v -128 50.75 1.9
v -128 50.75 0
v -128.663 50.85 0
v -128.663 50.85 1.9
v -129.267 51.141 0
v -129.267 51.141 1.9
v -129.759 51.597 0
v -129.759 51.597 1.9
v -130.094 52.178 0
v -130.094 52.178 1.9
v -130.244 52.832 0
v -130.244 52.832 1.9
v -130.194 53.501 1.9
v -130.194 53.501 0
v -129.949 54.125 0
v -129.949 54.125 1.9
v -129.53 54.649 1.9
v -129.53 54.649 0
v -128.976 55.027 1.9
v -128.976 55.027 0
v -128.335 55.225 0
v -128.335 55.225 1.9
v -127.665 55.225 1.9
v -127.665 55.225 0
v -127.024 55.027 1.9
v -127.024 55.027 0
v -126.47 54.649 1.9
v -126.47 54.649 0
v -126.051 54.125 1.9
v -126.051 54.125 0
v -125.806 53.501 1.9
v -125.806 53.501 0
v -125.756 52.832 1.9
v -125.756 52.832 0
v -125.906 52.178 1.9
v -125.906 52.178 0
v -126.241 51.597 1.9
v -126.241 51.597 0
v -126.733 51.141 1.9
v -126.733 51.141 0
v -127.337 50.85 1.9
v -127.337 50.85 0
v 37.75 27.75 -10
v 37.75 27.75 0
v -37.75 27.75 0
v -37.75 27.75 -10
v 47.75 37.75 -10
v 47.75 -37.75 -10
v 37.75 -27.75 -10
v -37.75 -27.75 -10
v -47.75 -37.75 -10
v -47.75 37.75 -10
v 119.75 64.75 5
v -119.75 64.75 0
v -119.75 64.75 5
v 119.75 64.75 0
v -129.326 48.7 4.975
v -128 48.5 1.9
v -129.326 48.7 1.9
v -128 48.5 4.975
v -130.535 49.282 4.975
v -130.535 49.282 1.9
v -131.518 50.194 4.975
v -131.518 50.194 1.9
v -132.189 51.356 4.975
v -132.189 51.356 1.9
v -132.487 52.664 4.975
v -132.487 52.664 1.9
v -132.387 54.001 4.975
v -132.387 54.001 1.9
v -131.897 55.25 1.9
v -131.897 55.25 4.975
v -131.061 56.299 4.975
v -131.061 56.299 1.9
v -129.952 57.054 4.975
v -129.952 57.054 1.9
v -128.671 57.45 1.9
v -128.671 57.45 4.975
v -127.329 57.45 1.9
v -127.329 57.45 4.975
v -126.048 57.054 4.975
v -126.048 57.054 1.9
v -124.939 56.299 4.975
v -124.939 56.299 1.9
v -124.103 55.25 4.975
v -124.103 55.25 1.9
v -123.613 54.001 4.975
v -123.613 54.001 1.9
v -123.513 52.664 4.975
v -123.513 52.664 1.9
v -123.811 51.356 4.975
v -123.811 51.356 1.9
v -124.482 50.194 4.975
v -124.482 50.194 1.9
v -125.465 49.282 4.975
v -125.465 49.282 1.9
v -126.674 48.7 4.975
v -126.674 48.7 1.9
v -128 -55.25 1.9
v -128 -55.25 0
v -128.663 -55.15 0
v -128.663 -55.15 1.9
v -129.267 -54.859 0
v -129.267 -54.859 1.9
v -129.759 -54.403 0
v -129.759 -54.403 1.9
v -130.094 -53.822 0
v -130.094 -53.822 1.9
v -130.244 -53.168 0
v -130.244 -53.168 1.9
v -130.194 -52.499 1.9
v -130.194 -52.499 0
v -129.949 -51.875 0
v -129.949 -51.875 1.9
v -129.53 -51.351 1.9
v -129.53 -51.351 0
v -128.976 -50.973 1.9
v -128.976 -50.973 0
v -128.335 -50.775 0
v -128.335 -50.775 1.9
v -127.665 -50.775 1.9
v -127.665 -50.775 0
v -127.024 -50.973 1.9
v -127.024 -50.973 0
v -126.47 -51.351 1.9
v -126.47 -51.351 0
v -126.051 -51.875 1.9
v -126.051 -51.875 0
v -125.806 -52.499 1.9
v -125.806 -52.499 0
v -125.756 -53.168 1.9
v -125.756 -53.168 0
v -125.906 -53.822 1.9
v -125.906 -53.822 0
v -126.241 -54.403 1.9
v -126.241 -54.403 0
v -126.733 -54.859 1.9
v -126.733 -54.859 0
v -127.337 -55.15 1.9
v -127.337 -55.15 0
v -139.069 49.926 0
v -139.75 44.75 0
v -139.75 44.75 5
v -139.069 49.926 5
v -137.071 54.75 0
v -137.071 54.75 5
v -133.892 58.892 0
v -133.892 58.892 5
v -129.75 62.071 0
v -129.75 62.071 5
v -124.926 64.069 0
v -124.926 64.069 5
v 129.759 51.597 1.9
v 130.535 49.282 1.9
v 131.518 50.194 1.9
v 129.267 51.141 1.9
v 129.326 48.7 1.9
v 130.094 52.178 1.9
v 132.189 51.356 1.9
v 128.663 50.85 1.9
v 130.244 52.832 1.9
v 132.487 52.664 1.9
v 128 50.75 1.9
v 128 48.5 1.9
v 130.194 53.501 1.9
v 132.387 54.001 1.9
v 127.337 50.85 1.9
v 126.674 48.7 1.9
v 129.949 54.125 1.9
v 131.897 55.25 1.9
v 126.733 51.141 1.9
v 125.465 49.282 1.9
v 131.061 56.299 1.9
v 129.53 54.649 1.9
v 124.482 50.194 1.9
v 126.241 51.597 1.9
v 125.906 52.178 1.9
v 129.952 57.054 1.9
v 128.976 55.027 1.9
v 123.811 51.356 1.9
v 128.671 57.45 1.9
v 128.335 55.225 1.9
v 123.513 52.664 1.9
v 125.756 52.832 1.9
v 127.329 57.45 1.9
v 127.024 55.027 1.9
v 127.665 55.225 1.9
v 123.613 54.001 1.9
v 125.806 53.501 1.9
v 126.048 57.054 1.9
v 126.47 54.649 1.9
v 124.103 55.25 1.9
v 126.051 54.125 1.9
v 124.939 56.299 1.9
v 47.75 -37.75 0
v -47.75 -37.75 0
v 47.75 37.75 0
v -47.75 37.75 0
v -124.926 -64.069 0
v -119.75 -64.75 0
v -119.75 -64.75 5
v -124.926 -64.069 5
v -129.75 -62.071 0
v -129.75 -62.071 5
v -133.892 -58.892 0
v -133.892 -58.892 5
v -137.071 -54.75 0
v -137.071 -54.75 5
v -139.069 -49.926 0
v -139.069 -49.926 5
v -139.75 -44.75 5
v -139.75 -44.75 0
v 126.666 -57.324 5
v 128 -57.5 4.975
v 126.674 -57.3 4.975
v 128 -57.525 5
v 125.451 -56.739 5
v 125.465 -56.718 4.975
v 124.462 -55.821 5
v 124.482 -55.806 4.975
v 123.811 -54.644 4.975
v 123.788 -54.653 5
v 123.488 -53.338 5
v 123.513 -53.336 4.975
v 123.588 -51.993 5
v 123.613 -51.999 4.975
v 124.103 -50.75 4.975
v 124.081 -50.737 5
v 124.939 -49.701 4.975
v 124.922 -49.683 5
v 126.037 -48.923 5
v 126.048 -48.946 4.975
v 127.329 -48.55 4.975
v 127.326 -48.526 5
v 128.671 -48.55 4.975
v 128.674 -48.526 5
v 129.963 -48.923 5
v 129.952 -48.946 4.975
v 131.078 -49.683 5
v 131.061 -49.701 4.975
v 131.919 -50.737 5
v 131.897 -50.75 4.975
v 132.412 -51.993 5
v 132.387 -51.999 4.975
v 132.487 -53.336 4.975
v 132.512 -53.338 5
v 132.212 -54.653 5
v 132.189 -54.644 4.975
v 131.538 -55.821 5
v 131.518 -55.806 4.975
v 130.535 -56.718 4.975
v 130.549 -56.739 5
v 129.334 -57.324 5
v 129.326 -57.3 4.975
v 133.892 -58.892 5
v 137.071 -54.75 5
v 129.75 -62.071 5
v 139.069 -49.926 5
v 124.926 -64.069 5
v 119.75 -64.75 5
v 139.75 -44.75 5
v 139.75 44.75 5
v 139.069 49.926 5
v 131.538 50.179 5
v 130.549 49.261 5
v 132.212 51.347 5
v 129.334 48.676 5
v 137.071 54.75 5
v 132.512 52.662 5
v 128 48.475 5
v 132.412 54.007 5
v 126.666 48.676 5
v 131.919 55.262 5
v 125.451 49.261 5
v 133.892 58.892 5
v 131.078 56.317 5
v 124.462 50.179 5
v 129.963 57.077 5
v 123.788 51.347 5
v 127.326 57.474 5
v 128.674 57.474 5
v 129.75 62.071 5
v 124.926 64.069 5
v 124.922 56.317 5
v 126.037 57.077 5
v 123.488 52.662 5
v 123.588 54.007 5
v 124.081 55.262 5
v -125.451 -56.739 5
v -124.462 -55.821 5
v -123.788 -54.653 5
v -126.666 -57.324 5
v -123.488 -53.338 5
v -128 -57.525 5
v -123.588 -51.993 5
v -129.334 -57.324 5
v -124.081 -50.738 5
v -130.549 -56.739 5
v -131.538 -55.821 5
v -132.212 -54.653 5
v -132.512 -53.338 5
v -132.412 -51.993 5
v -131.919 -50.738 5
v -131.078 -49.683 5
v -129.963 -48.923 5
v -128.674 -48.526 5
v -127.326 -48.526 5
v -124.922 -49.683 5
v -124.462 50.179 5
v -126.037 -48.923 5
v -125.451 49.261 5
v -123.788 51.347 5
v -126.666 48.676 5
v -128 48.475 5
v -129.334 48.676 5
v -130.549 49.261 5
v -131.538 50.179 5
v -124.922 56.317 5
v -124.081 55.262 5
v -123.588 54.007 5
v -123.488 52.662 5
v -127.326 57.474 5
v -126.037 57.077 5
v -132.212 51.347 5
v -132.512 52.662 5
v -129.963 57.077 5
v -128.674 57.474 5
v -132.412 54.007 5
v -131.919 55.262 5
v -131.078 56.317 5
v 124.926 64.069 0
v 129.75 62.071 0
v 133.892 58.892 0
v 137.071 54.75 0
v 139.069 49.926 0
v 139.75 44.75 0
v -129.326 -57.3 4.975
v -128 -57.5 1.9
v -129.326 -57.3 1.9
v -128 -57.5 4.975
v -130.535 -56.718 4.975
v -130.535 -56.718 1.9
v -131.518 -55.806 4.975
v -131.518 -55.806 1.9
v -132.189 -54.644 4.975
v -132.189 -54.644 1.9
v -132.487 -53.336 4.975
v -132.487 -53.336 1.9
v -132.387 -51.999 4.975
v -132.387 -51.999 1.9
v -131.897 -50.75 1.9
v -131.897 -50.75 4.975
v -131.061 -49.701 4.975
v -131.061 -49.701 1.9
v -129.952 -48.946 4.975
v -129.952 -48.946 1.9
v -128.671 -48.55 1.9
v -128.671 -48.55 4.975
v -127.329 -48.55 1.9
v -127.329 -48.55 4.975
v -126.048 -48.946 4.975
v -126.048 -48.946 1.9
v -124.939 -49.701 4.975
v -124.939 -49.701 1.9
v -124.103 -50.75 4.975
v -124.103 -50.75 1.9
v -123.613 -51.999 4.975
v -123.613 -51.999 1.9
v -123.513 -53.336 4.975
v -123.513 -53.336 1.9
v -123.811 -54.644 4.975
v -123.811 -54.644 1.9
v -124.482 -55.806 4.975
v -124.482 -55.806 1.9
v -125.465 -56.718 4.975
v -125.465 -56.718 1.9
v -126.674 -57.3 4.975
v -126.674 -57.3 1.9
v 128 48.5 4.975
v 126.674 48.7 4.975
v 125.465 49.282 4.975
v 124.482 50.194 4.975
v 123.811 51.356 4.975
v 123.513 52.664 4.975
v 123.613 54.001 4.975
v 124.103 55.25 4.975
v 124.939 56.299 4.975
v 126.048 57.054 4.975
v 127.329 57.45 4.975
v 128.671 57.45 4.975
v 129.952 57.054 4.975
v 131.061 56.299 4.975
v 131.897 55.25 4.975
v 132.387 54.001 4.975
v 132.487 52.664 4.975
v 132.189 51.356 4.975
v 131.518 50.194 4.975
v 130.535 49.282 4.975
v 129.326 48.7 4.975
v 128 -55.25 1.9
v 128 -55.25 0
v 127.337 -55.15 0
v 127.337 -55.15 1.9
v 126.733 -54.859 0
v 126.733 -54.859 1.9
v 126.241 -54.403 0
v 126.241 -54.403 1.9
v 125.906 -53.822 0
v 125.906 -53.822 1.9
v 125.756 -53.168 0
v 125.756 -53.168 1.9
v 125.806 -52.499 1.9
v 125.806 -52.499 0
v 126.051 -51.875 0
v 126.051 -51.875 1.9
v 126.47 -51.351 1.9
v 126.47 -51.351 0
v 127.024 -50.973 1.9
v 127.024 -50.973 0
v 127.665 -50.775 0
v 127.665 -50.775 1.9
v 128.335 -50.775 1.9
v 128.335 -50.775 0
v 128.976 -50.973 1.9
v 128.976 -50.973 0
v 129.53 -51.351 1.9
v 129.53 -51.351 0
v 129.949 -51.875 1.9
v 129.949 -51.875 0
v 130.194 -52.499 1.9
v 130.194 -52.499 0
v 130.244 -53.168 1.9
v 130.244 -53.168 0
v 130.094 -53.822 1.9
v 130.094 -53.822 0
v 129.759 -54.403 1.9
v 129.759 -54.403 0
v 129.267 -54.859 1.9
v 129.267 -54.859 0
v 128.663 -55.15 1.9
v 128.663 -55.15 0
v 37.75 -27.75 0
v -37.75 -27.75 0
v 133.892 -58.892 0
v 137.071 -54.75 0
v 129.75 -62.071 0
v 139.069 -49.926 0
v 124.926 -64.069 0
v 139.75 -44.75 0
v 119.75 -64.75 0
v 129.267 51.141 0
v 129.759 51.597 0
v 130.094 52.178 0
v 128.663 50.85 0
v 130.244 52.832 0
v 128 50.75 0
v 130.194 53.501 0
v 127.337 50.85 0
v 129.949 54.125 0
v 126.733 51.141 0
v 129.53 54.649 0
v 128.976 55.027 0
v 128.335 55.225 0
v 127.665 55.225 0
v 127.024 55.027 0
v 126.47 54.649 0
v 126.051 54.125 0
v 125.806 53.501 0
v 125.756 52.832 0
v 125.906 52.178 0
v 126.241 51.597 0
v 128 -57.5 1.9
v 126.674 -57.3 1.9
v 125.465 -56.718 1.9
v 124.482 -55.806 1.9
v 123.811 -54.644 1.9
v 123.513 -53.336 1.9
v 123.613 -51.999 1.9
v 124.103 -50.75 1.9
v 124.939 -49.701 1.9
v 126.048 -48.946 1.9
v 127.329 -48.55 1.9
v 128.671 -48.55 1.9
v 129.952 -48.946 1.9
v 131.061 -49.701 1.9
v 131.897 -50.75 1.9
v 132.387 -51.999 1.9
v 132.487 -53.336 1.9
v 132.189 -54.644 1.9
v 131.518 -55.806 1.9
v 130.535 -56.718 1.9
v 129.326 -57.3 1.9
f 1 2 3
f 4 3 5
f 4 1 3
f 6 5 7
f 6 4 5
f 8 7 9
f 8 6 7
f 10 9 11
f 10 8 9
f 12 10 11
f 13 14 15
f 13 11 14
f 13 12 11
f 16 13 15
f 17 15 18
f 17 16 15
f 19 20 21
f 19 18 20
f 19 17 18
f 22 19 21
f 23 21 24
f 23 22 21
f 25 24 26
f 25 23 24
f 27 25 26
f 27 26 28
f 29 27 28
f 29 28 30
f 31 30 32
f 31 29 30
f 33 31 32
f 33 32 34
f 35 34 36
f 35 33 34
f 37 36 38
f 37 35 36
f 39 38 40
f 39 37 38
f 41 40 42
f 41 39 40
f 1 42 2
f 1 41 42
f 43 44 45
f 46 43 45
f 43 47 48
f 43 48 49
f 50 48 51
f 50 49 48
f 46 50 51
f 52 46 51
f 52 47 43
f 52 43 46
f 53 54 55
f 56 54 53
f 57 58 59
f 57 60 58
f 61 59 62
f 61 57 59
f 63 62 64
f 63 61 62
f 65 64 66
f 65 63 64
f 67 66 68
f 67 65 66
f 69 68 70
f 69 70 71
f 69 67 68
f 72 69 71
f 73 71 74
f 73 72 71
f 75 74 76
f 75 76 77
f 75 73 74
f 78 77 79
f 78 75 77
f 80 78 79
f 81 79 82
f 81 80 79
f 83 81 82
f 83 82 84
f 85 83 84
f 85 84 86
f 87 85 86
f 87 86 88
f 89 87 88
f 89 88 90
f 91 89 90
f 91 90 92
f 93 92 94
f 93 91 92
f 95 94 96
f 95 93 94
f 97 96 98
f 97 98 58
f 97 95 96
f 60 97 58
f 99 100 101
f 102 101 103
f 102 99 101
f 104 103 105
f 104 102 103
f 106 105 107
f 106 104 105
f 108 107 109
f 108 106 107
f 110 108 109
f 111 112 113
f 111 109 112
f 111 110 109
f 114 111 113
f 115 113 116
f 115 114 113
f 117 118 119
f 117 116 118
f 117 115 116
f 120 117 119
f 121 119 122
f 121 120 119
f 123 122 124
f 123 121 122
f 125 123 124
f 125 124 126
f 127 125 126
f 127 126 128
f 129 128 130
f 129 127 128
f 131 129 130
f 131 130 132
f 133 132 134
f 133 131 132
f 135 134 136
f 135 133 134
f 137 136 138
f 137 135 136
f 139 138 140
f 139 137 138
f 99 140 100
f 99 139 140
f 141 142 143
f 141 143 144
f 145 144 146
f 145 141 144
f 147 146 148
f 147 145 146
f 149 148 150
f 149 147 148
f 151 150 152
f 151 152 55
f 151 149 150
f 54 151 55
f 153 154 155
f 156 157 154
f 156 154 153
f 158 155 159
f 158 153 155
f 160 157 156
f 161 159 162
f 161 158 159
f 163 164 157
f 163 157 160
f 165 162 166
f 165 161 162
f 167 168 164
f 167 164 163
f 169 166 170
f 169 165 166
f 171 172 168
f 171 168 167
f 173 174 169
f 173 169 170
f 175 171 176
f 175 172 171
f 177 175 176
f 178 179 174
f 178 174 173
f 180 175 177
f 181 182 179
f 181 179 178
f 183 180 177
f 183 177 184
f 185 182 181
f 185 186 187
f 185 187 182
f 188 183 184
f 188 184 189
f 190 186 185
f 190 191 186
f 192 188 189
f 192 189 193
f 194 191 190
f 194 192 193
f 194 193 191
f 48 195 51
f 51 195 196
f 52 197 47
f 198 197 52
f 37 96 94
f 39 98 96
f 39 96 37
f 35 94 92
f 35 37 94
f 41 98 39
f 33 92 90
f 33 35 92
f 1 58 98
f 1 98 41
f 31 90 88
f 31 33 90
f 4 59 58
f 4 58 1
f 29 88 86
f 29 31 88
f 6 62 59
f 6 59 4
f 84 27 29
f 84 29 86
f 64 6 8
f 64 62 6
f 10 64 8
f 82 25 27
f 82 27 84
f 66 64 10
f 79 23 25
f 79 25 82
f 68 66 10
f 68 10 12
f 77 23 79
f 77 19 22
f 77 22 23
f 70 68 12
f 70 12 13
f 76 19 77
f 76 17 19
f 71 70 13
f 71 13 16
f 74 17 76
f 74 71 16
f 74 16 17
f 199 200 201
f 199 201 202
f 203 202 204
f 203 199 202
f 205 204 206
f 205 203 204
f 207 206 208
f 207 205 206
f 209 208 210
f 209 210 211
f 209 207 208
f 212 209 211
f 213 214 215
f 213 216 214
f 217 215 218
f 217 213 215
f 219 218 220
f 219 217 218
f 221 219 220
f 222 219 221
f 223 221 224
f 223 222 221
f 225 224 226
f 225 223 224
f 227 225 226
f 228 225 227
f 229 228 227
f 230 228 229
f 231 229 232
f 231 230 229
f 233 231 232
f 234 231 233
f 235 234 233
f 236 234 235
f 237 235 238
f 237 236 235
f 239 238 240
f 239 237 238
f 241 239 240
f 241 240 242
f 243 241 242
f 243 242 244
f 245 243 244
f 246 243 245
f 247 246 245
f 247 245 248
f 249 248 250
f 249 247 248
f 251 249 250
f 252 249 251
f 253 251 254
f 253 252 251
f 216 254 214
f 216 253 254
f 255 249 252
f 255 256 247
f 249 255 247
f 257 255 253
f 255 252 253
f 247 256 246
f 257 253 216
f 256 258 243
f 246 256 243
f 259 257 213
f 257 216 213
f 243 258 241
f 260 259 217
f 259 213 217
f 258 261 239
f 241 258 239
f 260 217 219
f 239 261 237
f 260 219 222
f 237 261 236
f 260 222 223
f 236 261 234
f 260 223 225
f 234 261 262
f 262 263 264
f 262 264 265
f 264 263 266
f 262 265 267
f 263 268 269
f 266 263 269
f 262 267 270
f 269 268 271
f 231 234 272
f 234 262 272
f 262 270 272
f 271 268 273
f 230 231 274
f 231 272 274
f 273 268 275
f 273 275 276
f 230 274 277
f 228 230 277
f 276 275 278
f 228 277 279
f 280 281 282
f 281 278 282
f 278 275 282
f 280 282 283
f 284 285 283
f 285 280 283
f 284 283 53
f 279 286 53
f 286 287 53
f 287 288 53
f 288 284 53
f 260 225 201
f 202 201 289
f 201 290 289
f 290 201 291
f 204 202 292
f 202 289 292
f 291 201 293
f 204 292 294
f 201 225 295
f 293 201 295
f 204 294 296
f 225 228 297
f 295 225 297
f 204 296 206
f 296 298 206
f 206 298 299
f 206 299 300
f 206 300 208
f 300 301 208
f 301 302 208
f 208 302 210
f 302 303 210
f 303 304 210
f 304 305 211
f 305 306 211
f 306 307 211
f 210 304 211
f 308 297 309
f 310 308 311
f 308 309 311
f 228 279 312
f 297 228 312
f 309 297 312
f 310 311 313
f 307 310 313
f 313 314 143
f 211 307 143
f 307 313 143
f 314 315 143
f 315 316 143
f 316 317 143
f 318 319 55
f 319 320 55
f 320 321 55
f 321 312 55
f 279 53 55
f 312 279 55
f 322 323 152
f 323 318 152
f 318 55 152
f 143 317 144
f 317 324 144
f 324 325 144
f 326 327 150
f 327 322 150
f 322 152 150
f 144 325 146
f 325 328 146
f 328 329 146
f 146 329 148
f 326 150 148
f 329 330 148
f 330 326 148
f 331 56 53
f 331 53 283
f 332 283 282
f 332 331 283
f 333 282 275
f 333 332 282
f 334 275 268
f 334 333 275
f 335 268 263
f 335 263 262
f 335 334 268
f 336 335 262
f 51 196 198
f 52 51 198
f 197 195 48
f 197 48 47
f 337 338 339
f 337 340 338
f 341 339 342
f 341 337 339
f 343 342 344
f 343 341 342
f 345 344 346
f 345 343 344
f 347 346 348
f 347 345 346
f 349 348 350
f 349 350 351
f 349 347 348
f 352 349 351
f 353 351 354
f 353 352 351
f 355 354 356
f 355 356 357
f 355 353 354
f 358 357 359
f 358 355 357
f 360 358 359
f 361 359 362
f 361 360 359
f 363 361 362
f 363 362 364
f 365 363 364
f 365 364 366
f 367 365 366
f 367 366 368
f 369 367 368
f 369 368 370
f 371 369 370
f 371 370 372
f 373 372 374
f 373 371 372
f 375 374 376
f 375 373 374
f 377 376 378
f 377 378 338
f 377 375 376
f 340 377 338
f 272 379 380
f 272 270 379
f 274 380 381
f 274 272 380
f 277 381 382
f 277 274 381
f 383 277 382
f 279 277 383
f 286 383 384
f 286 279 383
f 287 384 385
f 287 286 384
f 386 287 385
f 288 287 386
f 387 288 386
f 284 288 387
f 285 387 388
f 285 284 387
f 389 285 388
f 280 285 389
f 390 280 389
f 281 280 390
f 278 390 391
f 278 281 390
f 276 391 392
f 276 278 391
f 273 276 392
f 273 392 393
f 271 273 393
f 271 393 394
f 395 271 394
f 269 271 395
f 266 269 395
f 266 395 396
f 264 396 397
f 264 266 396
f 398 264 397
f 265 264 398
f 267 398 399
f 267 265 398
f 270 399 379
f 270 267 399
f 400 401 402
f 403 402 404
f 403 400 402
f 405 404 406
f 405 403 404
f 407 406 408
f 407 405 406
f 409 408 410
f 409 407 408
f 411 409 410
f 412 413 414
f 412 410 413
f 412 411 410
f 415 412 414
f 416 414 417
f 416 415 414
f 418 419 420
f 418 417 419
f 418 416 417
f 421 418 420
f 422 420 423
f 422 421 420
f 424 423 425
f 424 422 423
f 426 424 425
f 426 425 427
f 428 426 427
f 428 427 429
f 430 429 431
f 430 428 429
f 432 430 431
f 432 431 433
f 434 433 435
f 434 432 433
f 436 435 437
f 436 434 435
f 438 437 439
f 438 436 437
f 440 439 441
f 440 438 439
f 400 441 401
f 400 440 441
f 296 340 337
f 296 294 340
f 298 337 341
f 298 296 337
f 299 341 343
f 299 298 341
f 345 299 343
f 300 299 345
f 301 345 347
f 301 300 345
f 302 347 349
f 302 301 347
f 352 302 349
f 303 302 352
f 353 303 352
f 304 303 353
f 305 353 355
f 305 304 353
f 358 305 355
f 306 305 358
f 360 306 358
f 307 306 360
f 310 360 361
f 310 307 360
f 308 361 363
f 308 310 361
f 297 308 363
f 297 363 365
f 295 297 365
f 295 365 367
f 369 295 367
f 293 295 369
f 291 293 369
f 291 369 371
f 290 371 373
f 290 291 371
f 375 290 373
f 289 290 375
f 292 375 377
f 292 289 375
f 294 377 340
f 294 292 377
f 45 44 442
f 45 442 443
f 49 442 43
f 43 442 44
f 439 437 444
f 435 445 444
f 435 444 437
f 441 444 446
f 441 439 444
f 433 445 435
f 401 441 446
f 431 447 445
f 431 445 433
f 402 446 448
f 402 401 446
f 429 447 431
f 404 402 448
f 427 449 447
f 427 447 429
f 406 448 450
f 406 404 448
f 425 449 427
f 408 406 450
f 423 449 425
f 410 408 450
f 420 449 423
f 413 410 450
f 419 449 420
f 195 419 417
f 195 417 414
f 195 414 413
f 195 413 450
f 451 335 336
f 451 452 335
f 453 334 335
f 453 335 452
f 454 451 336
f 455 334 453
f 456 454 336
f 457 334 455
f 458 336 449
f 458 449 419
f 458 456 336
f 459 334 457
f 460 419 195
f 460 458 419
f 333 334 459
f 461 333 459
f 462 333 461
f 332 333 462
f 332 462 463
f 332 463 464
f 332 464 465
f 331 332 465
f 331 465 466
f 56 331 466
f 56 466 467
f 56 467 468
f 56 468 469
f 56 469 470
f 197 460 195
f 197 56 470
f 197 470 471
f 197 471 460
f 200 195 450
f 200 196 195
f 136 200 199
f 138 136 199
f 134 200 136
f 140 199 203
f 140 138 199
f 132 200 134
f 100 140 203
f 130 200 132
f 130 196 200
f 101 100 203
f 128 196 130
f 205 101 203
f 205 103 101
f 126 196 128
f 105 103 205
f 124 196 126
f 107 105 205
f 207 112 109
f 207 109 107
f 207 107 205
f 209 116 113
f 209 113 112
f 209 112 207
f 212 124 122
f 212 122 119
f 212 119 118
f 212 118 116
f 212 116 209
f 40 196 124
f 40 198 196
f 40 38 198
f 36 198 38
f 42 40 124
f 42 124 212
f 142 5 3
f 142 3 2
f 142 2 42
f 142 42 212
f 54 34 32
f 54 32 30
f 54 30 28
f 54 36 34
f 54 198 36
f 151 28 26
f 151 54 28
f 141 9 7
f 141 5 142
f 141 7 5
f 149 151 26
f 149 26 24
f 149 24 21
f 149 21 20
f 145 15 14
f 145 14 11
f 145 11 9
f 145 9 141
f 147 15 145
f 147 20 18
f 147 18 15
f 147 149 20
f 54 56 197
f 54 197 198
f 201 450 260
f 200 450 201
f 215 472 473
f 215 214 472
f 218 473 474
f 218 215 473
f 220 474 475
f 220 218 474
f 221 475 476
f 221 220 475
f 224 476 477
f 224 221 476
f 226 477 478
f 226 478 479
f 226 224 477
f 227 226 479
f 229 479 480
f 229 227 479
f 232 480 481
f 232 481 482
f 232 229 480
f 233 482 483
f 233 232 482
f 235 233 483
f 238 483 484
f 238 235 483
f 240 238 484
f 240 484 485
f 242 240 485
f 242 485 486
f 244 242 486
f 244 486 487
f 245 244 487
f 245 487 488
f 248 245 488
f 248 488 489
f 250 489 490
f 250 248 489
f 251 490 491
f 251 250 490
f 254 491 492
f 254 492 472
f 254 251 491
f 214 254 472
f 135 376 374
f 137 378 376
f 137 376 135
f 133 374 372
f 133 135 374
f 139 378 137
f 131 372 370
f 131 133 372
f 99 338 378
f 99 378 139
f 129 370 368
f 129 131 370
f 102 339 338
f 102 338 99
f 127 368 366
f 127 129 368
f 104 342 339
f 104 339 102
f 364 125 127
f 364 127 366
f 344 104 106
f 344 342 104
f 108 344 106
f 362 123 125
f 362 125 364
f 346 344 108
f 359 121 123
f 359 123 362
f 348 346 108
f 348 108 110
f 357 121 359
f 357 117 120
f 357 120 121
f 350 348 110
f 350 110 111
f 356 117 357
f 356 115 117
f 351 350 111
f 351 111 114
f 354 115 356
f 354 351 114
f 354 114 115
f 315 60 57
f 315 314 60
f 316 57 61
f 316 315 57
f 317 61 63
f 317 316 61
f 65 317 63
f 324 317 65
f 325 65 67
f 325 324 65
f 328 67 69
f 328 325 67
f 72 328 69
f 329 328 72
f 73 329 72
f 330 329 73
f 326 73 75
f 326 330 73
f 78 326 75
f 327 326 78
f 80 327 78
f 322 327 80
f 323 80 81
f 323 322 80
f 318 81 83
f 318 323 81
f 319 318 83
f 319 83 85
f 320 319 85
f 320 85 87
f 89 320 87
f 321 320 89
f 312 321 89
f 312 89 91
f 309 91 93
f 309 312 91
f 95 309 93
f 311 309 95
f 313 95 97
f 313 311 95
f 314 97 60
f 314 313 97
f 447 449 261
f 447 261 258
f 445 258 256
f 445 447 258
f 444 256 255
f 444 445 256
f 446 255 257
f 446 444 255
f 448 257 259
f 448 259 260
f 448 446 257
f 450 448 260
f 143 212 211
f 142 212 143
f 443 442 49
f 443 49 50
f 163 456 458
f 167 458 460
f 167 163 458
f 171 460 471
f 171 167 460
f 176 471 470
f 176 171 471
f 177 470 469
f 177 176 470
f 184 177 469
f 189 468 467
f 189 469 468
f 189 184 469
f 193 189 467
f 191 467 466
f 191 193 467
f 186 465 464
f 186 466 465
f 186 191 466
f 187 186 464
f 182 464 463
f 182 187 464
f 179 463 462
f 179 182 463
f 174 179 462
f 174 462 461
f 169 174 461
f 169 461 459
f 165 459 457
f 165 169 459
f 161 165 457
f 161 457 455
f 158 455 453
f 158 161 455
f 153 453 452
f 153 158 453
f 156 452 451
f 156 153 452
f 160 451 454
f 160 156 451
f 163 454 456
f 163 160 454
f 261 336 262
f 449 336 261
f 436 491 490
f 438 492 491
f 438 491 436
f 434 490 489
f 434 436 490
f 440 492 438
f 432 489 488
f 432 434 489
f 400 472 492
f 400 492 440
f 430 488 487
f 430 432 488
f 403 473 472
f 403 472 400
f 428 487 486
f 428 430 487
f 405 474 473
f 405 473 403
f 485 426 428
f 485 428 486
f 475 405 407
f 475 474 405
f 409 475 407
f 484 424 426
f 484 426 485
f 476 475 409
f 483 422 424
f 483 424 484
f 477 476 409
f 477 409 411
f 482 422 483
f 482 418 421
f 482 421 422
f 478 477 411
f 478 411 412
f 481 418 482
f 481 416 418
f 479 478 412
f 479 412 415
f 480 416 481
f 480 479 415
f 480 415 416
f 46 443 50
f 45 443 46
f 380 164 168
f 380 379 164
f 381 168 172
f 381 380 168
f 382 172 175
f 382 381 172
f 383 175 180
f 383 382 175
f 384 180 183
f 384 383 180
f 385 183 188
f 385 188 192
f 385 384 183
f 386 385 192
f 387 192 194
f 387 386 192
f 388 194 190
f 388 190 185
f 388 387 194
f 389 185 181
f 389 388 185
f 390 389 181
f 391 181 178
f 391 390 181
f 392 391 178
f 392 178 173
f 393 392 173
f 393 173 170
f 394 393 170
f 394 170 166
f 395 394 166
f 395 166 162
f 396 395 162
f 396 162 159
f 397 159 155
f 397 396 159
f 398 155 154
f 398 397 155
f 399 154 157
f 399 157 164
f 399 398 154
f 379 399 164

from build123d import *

# Parameters (mm, degrees)
BOSS_EXTRUDE1_DEPTH                           = 5
CBORE_FOR_M4_PAN_HEAD_MACHINE_SCREW1_AT_COUNT = 2
CBORE_FOR_M4_PAN_HEAD_MACHINE_SCREW1_AT_PITCH = 106
CBORE_FOR_M4_PAN_HEAD_MACHINE_SCREW1_2_COUNT  = 2
CBORE_FOR_M4_PAN_HEAD_MACHINE_SCREW1_2_PITCH  = 256
CBORE_FOR_M4_PAN_HEAD_MACHINE_SCREW1_3_COUNT  = 2
CBORE_FOR_M4_PAN_HEAD_MACHINE_SCREW1_3_PITCH  = 277.077606457
SKETCH4_W                                     = 95.5
SKETCH4_H                                     = 75.5
SKETCH4_W_2                                   = 75.5
SKETCH4_H_2                                   = 55.5
BOSS_EXTRUDE2_DEPTH                           = 10


with BuildPart() as part:
    # Sketch1 → Boss-Extrude1 (new body)
    with BuildSketch(Plane.XY):
        with BuildLine():
            Line((-119.75, 64.75), (119.75, 64.75))
            ThreePointArc((119.75, 64.75), (133.892135624, 58.892135624), (139.75, 44.75))
            Line((139.75, 44.75), (139.75, -44.75))
            ThreePointArc((139.75, -44.75), (133.892135624, -58.892135624), (119.75, -64.75))
            Line((119.75, -64.75), (-119.75, -64.75))
            ThreePointArc((-119.75, -64.75), (-133.892135624, -58.892135624), (-139.75, -44.75))
            Line((-139.75, -44.75), (-139.75, 44.75))
            ThreePointArc((-139.75, 44.75), (-133.892135624, 58.892135624), (-119.75, 64.75))
        make_face()
    extrude(amount=BOSS_EXTRUDE1_DEPTH)

    # Sketch3 → CBORE for M4 Pan Head Machine Screw1 (revolve, cut)
    with BuildSketch(Plane(origin=(-128, 53, 5), x_dir=(0, -1, 0), z_dir=(1, 0, 0))):
        Polygon((0, 0), (0, 31.351936393), (2.25, 30), (2.25, 3.1), (4.5, 3.1), (4.5, 0.025), (4.525, 0), align=None)
    cbore_for_m4_pan_head_machine_screw1 = revolve(axis=Axis((-128, 53, 11.35), (0, 0, -1)), mode=Mode.SUBTRACT)

    # CBORE for M4 Pan Head Machine Screw1 at: CBORE for M4 Pan Head Machine Screw1 ×2
    with Locations(*[(0, -i * CBORE_FOR_M4_PAN_HEAD_MACHINE_SCREW1_AT_PITCH, 0) for i in range(1, CBORE_FOR_M4_PAN_HEAD_MACHINE_SCREW1_AT_COUNT)]):
        add(cbore_for_m4_pan_head_machine_screw1, mode=Mode.SUBTRACT)

    # CBORE for M4 Pan Head Machine Screw1 2: CBORE for M4 Pan Head Machine Screw1 ×2
    with Locations(*[(i * CBORE_FOR_M4_PAN_HEAD_MACHINE_SCREW1_2_PITCH, 0, 0) for i in range(1, CBORE_FOR_M4_PAN_HEAD_MACHINE_SCREW1_2_COUNT)]):
        add(cbore_for_m4_pan_head_machine_screw1, mode=Mode.SUBTRACT)

    # CBORE for M4 Pan Head Machine Screw1 3: CBORE for M4 Pan Head Machine Screw1 ×2
    with Locations(*[Vector(0.9239288705910963, -0.38256429797912583, 0) * (i * CBORE_FOR_M4_PAN_HEAD_MACHINE_SCREW1_3_PITCH) for i in range(1, CBORE_FOR_M4_PAN_HEAD_MACHINE_SCREW1_3_COUNT)]):
        add(cbore_for_m4_pan_head_machine_screw1, mode=Mode.SUBTRACT)

    # Sketch4 → Boss-Extrude2 (add)
    with BuildSketch(Plane(origin=(0, 0, 0), x_dir=(-1, 0, 0), z_dir=(0, 0, -1))):
        Rectangle(SKETCH4_W, SKETCH4_H)
        Rectangle(SKETCH4_W_2, SKETCH4_H_2, mode=Mode.SUBTRACT)
    extrude(amount=BOSS_EXTRUDE2_DEPTH)


solid = part.part
